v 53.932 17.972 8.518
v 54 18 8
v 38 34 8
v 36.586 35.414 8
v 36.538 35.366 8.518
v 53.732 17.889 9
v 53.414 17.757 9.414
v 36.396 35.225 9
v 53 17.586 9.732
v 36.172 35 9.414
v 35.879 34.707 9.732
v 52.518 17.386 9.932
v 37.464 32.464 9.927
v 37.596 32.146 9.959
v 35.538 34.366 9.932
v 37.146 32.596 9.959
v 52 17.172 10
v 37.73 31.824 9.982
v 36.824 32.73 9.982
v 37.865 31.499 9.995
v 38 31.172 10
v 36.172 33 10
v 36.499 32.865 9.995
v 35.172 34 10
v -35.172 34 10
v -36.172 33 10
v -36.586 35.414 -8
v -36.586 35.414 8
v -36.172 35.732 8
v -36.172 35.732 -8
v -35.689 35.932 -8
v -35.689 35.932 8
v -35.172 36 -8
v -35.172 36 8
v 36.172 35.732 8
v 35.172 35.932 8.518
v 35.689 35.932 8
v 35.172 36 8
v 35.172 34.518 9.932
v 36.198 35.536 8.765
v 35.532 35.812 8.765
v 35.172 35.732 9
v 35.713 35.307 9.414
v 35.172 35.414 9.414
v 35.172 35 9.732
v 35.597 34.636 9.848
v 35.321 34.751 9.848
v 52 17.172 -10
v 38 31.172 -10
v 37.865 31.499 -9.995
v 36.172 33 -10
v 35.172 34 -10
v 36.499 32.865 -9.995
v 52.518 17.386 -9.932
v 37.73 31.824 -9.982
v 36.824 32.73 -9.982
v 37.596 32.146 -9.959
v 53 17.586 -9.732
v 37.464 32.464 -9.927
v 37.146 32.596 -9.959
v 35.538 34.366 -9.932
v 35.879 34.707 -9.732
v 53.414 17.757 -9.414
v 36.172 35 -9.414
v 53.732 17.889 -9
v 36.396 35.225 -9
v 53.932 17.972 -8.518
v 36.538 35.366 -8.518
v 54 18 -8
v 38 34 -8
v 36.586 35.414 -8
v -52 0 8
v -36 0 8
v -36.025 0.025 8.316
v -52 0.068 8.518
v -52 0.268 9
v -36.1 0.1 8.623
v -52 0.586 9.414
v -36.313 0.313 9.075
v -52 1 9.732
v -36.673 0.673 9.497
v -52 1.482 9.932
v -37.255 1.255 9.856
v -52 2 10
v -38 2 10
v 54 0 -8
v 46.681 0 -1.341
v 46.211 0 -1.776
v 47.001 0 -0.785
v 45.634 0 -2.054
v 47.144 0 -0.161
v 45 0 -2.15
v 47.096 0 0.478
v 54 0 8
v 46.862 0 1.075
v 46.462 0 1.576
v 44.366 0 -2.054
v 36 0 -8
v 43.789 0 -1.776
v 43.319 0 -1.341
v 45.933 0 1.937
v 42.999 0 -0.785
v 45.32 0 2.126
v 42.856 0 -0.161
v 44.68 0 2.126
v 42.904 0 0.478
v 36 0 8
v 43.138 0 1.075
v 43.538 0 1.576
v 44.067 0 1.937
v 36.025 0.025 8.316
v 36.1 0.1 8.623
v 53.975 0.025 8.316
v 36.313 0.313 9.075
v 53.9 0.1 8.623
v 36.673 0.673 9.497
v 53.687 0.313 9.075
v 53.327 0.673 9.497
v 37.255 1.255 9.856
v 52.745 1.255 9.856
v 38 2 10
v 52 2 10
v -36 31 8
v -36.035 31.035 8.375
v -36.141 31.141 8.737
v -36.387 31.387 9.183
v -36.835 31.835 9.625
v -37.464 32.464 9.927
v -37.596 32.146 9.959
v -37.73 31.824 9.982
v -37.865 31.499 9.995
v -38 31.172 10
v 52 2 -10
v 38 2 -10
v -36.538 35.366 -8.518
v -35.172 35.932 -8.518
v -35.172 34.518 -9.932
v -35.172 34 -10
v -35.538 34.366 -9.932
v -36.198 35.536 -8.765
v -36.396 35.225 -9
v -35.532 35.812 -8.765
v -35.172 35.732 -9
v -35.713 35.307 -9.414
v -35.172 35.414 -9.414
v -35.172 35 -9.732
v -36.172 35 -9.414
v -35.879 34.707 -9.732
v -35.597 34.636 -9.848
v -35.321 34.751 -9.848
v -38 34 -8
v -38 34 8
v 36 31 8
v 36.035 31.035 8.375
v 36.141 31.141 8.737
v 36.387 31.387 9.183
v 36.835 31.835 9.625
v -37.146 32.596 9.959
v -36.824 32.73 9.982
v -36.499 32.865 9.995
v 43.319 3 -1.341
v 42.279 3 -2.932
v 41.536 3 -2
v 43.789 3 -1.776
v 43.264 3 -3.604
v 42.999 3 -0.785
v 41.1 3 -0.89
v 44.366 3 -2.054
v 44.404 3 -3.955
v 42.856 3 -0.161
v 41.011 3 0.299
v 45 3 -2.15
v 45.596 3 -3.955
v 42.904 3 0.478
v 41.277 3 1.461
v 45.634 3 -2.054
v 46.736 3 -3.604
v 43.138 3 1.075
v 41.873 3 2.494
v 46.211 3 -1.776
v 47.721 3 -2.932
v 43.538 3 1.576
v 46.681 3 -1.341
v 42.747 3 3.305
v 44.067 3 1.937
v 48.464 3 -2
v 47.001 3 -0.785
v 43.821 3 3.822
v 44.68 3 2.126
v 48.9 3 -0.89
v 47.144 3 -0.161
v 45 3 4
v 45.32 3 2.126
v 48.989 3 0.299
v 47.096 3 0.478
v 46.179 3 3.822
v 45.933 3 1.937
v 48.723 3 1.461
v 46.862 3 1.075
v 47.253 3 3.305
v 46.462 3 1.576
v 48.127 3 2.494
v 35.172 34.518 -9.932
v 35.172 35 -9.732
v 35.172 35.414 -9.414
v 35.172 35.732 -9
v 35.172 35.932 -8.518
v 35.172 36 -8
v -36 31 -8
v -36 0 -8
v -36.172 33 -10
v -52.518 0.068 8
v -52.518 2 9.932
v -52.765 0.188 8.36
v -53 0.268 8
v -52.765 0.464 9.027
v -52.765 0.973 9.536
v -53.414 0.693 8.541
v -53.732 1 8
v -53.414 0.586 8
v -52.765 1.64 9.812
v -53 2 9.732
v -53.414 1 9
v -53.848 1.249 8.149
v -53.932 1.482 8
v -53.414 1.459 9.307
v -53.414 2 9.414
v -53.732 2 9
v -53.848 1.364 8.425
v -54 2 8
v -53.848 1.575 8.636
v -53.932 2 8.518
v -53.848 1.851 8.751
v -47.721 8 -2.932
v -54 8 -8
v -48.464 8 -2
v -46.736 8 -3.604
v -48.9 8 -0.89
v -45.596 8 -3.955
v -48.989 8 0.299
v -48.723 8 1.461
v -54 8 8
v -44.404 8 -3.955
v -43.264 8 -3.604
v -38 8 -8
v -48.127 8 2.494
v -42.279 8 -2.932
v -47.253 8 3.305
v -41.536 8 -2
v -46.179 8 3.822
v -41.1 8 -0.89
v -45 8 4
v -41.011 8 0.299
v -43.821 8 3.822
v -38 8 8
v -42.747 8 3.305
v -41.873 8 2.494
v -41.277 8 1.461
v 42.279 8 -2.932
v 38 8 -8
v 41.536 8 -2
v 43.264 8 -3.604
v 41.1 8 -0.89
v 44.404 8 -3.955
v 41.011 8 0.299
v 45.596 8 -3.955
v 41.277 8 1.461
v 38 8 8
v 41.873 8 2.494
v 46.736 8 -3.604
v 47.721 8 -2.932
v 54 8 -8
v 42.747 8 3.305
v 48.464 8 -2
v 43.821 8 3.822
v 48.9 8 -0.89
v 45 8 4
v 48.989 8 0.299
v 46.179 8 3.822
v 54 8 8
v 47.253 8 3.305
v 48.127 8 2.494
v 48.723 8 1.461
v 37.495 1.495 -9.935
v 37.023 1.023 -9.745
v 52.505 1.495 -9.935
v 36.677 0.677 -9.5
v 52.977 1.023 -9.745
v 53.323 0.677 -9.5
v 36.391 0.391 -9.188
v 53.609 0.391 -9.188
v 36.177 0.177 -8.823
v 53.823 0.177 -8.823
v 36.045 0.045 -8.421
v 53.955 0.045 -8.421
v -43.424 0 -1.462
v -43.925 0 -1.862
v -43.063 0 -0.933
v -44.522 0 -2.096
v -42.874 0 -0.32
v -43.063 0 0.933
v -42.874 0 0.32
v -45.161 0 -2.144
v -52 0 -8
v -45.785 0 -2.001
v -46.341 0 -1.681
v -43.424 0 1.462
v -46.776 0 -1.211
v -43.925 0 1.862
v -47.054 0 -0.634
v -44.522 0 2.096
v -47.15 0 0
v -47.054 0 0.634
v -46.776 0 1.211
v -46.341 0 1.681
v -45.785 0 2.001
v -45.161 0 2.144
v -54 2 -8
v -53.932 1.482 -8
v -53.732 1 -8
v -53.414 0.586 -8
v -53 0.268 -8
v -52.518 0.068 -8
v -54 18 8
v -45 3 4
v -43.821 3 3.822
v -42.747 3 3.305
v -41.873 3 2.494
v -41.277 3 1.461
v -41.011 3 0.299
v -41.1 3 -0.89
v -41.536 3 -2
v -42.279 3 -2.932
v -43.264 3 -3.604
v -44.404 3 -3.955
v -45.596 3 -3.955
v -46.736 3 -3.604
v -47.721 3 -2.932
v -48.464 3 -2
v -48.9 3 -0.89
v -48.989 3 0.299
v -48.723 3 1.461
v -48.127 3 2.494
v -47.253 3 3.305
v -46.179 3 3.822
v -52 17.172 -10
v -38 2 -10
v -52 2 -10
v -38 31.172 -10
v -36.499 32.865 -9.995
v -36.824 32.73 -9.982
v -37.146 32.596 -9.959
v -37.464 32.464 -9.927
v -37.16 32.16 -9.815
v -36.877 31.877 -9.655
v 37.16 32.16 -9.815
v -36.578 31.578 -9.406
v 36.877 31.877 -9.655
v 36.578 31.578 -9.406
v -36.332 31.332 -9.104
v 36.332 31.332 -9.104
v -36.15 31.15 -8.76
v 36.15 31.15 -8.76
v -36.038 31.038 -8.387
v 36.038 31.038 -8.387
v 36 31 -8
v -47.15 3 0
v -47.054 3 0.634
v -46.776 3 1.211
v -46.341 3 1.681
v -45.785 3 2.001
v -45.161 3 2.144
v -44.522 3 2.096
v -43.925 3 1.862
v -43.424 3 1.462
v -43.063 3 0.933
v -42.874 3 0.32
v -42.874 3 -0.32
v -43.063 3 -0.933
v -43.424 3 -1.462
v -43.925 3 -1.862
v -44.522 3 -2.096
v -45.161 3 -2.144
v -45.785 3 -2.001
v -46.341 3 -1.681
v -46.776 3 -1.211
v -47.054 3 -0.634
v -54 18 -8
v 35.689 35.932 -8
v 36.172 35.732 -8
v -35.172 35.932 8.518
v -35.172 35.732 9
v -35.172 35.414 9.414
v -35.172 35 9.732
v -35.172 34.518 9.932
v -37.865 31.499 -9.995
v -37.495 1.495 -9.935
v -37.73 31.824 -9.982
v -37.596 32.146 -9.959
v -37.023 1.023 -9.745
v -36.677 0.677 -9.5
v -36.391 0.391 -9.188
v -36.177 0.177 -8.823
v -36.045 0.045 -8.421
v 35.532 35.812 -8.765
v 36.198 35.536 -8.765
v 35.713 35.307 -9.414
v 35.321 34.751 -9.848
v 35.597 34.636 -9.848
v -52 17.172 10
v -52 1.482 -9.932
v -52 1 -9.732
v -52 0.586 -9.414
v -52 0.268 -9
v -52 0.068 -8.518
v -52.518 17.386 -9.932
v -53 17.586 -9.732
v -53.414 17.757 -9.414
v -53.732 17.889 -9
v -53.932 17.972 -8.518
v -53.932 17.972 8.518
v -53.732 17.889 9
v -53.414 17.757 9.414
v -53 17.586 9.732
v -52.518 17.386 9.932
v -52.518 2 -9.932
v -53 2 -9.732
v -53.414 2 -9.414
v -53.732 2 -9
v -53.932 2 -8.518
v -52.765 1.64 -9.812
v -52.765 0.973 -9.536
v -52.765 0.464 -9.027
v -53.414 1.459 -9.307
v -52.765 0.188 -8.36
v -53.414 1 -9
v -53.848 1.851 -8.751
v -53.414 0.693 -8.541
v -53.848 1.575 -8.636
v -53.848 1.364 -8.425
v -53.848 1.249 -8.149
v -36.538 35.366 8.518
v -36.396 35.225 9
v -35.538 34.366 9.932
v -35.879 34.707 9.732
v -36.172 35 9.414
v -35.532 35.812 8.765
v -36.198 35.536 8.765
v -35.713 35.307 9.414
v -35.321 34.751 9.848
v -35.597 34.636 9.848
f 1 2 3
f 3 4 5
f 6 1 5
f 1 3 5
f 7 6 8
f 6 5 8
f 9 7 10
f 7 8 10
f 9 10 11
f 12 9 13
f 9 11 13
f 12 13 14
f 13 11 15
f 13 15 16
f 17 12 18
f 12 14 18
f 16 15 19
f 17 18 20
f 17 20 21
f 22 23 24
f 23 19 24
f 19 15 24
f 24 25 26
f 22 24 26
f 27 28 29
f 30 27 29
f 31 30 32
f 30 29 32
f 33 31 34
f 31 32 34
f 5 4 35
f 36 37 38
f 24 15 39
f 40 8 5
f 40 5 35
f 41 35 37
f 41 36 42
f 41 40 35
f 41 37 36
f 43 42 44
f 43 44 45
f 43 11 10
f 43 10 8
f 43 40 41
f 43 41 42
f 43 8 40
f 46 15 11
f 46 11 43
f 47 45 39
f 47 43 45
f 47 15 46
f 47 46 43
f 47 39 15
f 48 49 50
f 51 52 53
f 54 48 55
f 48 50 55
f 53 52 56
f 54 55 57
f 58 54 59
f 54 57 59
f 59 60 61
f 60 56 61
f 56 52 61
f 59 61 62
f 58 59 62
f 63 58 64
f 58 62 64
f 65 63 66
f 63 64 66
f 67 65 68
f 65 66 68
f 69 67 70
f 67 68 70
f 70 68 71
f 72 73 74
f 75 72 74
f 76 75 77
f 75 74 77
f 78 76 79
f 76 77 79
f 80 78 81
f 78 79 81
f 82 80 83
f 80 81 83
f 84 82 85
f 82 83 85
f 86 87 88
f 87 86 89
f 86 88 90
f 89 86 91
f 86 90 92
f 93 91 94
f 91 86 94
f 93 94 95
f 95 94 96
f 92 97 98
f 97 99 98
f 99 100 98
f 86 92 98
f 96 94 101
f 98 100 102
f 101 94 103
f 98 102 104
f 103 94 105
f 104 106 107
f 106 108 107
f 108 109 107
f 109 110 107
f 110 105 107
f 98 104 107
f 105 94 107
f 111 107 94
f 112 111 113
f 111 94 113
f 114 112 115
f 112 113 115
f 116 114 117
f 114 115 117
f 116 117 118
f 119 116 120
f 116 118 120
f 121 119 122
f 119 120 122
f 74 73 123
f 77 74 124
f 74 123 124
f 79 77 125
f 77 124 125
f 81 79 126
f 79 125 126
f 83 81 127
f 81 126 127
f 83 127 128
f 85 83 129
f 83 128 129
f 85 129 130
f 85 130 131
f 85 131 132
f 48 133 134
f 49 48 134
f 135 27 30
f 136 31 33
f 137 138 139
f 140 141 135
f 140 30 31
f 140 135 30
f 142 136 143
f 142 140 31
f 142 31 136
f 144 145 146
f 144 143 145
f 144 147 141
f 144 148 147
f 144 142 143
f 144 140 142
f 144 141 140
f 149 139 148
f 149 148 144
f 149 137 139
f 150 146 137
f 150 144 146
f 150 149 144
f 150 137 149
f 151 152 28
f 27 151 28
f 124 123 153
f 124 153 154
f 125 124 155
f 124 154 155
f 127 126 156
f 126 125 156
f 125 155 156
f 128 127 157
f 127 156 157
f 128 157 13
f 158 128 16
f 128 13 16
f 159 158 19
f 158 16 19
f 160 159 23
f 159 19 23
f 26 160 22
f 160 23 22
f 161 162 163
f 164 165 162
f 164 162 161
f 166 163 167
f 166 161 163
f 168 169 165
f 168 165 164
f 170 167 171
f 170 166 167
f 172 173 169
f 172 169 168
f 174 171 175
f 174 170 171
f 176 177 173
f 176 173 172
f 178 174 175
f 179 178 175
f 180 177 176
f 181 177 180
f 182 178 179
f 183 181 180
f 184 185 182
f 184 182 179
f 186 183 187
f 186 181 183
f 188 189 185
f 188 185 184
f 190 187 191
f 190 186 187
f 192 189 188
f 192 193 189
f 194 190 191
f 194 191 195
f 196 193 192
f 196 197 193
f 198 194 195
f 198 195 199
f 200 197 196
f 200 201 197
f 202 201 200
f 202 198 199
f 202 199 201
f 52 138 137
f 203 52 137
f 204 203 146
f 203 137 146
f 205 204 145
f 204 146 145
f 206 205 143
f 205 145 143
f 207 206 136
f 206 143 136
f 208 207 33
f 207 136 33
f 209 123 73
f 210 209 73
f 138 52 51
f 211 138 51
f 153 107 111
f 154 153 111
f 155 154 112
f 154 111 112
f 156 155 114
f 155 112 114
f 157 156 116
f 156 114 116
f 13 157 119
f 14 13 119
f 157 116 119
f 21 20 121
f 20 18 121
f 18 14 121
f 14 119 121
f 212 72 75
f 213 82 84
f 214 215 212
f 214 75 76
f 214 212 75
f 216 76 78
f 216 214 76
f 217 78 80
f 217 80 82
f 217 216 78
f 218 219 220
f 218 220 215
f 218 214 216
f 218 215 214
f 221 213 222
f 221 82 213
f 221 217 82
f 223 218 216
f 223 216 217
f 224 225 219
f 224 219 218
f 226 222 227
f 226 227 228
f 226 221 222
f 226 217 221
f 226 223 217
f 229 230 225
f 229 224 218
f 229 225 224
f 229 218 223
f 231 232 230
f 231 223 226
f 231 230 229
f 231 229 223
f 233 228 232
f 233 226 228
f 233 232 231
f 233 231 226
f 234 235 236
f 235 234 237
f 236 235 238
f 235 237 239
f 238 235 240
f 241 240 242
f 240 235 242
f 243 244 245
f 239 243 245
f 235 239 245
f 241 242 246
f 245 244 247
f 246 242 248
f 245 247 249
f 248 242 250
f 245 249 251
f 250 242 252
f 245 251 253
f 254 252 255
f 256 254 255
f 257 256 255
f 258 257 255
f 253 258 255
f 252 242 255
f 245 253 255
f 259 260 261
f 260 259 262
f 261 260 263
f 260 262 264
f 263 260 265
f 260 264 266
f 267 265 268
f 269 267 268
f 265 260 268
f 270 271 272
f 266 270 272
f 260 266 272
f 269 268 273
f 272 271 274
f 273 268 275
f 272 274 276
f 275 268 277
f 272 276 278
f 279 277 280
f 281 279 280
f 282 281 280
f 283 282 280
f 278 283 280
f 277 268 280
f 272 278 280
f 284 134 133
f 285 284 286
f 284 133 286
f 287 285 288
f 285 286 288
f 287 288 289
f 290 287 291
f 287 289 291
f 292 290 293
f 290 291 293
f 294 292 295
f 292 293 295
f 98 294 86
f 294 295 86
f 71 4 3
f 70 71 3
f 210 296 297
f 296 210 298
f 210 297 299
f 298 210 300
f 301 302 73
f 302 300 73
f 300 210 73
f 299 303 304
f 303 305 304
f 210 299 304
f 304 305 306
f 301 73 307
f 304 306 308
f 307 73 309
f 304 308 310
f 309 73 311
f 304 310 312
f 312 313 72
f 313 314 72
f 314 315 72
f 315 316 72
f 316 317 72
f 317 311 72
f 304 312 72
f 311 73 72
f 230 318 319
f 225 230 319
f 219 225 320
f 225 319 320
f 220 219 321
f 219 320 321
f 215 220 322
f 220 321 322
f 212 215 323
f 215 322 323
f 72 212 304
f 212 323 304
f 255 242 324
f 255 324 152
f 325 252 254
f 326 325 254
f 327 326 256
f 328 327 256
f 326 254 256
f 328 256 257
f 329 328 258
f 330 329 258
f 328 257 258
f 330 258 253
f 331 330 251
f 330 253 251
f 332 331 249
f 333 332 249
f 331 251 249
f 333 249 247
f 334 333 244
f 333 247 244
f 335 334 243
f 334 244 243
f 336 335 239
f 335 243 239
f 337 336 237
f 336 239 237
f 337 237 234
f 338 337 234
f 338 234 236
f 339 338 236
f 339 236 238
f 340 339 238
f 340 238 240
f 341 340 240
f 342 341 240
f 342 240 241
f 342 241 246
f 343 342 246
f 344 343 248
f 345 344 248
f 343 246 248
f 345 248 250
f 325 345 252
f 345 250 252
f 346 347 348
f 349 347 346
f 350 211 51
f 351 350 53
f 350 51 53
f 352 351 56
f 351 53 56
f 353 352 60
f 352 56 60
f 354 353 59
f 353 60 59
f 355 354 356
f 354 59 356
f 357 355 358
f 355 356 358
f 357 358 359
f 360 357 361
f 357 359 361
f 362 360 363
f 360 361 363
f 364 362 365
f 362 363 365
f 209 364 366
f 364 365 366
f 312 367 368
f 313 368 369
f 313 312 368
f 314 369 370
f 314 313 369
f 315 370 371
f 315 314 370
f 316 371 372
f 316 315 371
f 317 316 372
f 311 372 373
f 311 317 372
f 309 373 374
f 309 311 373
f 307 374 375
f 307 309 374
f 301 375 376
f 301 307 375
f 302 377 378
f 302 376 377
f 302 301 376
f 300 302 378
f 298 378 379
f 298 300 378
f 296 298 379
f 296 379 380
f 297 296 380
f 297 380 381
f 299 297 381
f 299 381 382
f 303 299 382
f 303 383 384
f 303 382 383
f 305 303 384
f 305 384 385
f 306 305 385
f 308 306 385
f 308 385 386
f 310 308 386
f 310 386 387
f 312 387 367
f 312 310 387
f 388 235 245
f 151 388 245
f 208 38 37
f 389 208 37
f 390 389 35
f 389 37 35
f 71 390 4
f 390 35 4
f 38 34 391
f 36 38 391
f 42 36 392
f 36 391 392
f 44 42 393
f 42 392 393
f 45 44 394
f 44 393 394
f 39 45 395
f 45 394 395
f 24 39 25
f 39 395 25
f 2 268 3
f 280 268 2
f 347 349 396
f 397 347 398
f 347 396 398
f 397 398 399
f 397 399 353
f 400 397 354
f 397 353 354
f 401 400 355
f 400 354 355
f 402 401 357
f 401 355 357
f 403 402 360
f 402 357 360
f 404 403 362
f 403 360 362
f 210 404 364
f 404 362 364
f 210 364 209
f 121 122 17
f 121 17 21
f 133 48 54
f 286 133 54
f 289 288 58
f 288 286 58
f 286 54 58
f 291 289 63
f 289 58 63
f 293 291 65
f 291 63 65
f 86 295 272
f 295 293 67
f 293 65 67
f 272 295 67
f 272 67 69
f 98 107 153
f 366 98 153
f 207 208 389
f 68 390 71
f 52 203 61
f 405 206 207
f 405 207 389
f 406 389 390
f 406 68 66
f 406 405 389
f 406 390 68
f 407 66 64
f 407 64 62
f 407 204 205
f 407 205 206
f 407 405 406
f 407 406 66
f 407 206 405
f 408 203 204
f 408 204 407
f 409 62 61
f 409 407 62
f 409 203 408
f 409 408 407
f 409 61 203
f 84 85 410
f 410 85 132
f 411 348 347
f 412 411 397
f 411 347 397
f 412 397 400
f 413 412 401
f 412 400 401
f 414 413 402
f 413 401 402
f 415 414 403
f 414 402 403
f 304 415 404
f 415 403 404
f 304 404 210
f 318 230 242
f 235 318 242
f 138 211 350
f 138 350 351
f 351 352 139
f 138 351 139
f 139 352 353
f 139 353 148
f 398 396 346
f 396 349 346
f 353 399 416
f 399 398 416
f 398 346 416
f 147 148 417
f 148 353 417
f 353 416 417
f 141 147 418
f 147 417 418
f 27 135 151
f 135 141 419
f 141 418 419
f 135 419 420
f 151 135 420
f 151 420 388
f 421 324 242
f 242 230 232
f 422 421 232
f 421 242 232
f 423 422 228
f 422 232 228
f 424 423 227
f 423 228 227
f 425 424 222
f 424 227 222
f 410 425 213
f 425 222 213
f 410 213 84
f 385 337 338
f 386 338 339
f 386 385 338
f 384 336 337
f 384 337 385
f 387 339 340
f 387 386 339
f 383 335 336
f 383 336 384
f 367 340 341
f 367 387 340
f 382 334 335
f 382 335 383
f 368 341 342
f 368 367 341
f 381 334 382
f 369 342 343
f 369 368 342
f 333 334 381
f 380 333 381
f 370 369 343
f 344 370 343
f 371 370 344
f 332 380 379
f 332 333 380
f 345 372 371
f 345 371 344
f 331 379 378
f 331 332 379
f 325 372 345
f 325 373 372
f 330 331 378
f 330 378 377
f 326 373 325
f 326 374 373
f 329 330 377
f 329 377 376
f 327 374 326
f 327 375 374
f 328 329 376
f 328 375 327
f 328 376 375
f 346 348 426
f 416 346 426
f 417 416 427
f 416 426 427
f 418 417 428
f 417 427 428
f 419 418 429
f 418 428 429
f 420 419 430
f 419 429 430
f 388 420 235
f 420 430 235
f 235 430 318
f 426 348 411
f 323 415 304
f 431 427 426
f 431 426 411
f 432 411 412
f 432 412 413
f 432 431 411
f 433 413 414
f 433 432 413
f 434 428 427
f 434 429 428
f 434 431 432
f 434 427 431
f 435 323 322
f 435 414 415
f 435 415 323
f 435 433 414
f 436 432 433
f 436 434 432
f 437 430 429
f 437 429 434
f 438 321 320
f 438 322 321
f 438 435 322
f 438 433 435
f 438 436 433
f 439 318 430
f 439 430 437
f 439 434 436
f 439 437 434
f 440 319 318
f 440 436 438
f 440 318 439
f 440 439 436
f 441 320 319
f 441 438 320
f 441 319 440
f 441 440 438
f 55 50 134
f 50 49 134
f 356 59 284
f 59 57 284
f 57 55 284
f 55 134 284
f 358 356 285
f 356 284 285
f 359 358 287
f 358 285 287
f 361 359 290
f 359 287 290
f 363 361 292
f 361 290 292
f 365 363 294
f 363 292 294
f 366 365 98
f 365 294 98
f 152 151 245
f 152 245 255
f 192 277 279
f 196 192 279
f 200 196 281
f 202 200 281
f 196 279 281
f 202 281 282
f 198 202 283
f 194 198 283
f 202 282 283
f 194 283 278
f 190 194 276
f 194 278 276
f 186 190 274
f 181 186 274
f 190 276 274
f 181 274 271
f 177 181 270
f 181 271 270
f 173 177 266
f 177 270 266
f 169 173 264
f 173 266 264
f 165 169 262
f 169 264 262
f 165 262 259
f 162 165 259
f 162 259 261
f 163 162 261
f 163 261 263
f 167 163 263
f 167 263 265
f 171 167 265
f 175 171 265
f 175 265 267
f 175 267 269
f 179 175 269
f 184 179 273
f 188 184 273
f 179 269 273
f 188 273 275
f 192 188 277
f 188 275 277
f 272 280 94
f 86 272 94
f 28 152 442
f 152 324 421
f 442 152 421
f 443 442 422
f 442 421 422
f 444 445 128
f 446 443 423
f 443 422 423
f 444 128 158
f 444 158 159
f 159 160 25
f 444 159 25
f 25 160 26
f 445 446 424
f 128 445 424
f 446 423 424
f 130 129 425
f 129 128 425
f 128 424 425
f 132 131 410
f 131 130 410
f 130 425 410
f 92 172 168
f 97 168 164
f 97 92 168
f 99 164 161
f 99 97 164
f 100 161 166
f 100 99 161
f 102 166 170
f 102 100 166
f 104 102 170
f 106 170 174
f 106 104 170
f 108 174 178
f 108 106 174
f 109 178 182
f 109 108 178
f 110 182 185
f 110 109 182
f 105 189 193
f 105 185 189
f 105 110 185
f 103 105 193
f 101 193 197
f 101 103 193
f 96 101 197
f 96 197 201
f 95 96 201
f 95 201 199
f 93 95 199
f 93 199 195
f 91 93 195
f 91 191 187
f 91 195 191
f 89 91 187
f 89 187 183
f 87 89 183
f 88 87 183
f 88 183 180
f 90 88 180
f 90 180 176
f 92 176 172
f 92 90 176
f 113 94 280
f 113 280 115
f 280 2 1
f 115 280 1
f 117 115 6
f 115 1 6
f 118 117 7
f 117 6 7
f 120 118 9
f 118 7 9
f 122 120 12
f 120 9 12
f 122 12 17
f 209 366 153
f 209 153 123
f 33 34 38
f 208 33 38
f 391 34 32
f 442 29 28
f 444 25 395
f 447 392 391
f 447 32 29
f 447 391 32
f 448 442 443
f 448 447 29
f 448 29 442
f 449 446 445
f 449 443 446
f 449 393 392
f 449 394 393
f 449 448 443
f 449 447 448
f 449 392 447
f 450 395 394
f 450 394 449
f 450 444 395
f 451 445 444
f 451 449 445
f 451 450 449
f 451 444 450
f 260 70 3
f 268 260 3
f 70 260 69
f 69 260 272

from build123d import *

# Parameters (mm, degrees)
EXTRUDE_1_DEPTH     = 10
SKETCH_2_R          = 2.15
CUT_EXTRUDE_1_DEPTH = 66.665820638
CUT_EXTRUDE_START   = -8
SKETCH_3_W          = 16
SKETCH_3_H          = 16
CUT_EXTRUDE_2_DEPTH = 58.665820638
SKETCH_4_R          = 4
CUT_EXTRUDE_3_DEPTH = 5
FILLET_1_R          = 2


with BuildPart() as part:
    # 草图1 → 凸台-拉伸1 (new, symmetric)
    with BuildSketch(Plane.XY):
        Polygon((-54, 0), (-54, 18), (-36, 36), (36, 36), (54, 18), (54, 0), (36, 0), (36, 31), (-36, 31), (-36, 0), align=None)
    extrude(amount=EXTRUDE_1_DEPTH, both=True)

    # 草图2 → 切除-拉伸1 (cut, through all)
    with BuildSketch(Plane(origin=(0, 0, 0), x_dir=(1, 0, 0), z_dir=(0, 1, 0))):
        with Locations(Location((-45, 0, 0), (0, 0, 180))):
            Circle(SKETCH_2_R)
        with Locations(Location((45, 0, 0), (0, 0, 90))):
            Circle(SKETCH_2_R)
    extrude(amount=CUT_EXTRUDE_1_DEPTH, mode=Mode.SUBTRACT)

    # 草图3 → 切除-拉伸2 (cut, through all)
    with BuildSketch(Plane.XZ.offset(CUT_EXTRUDE_START)):
        with Locations((-46, 0)):
            Rectangle(SKETCH_3_W, SKETCH_3_H)
        with Locations((46, 0)):
            Rectangle(SKETCH_3_W, SKETCH_3_H)
    extrude(amount=-CUT_EXTRUDE_2_DEPTH, mode=Mode.SUBTRACT)

    # 草图4 → 切除-拉伸3 (cut)
    with BuildSketch(Plane(origin=(0, 8, 0), x_dir=(1, 0, 0), z_dir=(0, 1, 0))):
        with Locations(Location((45, 0, 0), (0, 0, 270))):
            Circle(SKETCH_4_R)
        with Locations(Location((-45, 0, 0), (0, 0, 270))):
            Circle(SKETCH_4_R)
    extrude(amount=-CUT_EXTRUDE_3_DEPTH, mode=Mode.SUBTRACT)

    # 圆角1
    # the kernel refuses this fillet: 2 mm, written as the material it takes off along each edge
    with BuildSketch(Plane(origin=(-52, 2, 8), x_dir=(0, -1, 0), z_dir=(-1, 0, 0))) as fillet_1_piece_1_section:
        Polygon((0, 0), (FILLET_1_R, 0), (FILLET_1_R, FILLET_1_R), (0, FILLET_1_R), align=None)
    fillet_1_piece_1 = extrude(amount=FILLET_1_R, mode=Mode.PRIVATE)
    fillet_1_piece_1 = fillet_1_piece_1 - Plane(origin=(-52, 2, 8), x_dir=(0, 0.7071067811865475, -0.7071067811865475), z_dir=(-1, 0, 0)) * Sphere(FILLET_1_R, mode=Mode.PRIVATE)
    add(fillet_1_piece_1, mode=Mode.SUBTRACT)
    with BuildSketch(Plane(origin=(-35.171572875, 34, 8), x_dir=(-0.7071067811865515, 0.7071067811865437, 0), z_dir=(0, 0, 1))) as fillet_1_piece_2_section:
        Polygon((0, 0), (FILLET_1_R, 0), (FILLET_1_R, -FILLET_1_R * 0.414213562373), (FILLET_1_R * 0.707106781187, -FILLET_1_R * 0.707106781187), align=None)
    fillet_1_piece_2 = extrude(amount=FILLET_1_R, mode=Mode.PRIVATE)
    fillet_1_piece_2 = fillet_1_piece_2 - Plane(origin=(-35.171572875, 34, 8), x_dir=(0.38268343236509234, -0.9238795325112857, 0), z_dir=(0, 0, 1)) * Sphere(FILLET_1_R, mode=Mode.PRIVATE)
    add(fillet_1_piece_2, mode=Mode.SUBTRACT)
    with BuildSketch(Plane(origin=(35.171572875, 34, 8), x_dir=(0.7071067811865515, 0.7071067811865437, 0), z_dir=(0, 0, 1))) as fillet_1_piece_3_section:
        Polygon((0, 0), (FILLET_1_R, 0), (FILLET_1_R, FILLET_1_R * 0.414213562373), (FILLET_1_R * 0.707106781187, FILLET_1_R * 0.707106781187), align=None)
    fillet_1_piece_3 = extrude(amount=FILLET_1_R, mode=Mode.PRIVATE)
    fillet_1_piece_3 = fillet_1_piece_3 - Plane(origin=(35.171572875, 34, 8), x_dir=(-0.38268343236509234, -0.9238795325112857, 0), z_dir=(0, 0, 1)) * Sphere(FILLET_1_R, mode=Mode.PRIVATE)
    add(fillet_1_piece_3, mode=Mode.SUBTRACT)
    with BuildSketch(Plane(origin=(35.171572875, 34, -8), x_dir=(0, 1, 0), z_dir=(0, 0, -1))) as fillet_1_piece_4_section:
        Polygon((0, 0), (FILLET_1_R, 0), (FILLET_1_R, FILLET_1_R * 0.414213562373), (FILLET_1_R * 0.707106781187, FILLET_1_R * 0.707106781187), align=None)
    fillet_1_piece_4 = extrude(amount=FILLET_1_R, mode=Mode.PRIVATE)
    fillet_1_piece_4 = fillet_1_piece_4 - Plane(origin=(35.171572875, 34, -8), x_dir=(-0.38268343236509234, -0.9238795325112857, 0), z_dir=(0, 0, -1)) * Sphere(FILLET_1_R, mode=Mode.PRIVATE)
    add(fillet_1_piece_4, mode=Mode.SUBTRACT)
    with BuildSketch(Plane(origin=(-35.171572875, 34, -8), x_dir=(0, 1, 0), z_dir=(0, 0, -1))) as fillet_1_piece_5_section:
        Polygon((0, 0), (FILLET_1_R, 0), (FILLET_1_R, -FILLET_1_R * 0.414213562373), (FILLET_1_R * 0.707106781187, -FILLET_1_R * 0.707106781187), align=None)
    fillet_1_piece_5 = extrude(amount=FILLET_1_R, mode=Mode.PRIVATE)
    fillet_1_piece_5 = fillet_1_piece_5 - Plane(origin=(-35.171572875, 34, -8), x_dir=(0.38268343236509234, -0.9238795325112857, 0), z_dir=(0, 0, -1)) * Sphere(FILLET_1_R, mode=Mode.PRIVATE)
    add(fillet_1_piece_5, mode=Mode.SUBTRACT)
    with BuildSketch(Plane(origin=(-52, 2, -8), x_dir=(0, -1, 0), z_dir=(-1, 0, 0))) as fillet_1_piece_6_section:
        Polygon((0, 0), (FILLET_1_R, 0), (FILLET_1_R, -FILLET_1_R), (0, -FILLET_1_R), align=None)
    fillet_1_piece_6 = extrude(amount=FILLET_1_R, mode=Mode.PRIVATE)
    fillet_1_piece_6 = fillet_1_piece_6 - Plane(origin=(-52, 2, -8), x_dir=(0, 0.7071067811865475, 0.7071067811865475), z_dir=(-1, 0, 0)) * Sphere(FILLET_1_R, mode=Mode.PRIVATE)
    add(fillet_1_piece_6, mode=Mode.SUBTRACT)
    with BuildSketch(Plane(origin=(-54, 2, 10), x_dir=(0, 0, -1), z_dir=(0, 1, 0)), Plane(origin=(-31, 0, 10), x_dir=(0, 0, -1), z_dir=(-1, 0, 0))) as fillet_1_piece_7:
        with BuildLine():
            CenterArc((FILLET_1_R, -FILLET_1_R), FILLET_1_R, 90, 90)
            Line((0, -FILLET_1_R), (0, 0))
            Line((0, 0), (FILLET_1_R, 0))
        make_face()
    extrude(amount=21, mode=Mode.SUBTRACT)
    with BuildSketch(Plane(origin=(-57.535533906, 14.464466094, 10), x_dir=(0.7071067811865515, -0.7071067811865437, 0), z_dir=(0.7071067811865437, 0.7071067811865515, 0)), Plane(origin=(36.585786438, 35.414213562, 10), x_dir=(-0.7071067811865515, -0.7071067811865437, 0), z_dir=(0.7071067811865437, -0.7071067811865515, 0)), Plane(origin=(-57.535533906, 14.464466094, -10), x_dir=(0, 0, 1), z_dir=(0.7071067811865437, 0.7071067811865515, 0))) as fillet_1_piece_8:
        with BuildLine():
            CenterArc((FILLET_1_R, FILLET_1_R), FILLET_1_R, 180, 90)
            Line((0, FILLET_1_R), (0, 0))
            Line((0, 0), (FILLET_1_R, 0))
        make_face()
    extrude(amount=29.627416998, mode=Mode.SUBTRACT)
    with BuildSketch(Plane(origin=(54, 23, 10), x_dir=(-1, 0, 0), z_dir=(0, -1, 0)), Plane(origin=(59, 0, 10), x_dir=(0, 1, 0), z_dir=(-1, 0, 0))) as fillet_1_piece_9:
        with BuildLine():
            CenterArc((FILLET_1_R, FILLET_1_R), FILLET_1_R, 180, 90)
            Line((0, FILLET_1_R), (0, 0))
            Line((0, 0), (FILLET_1_R, 0))
        make_face()
    extrude(amount=28, mode=Mode.SUBTRACT)
    with BuildSketch(Plane(origin=(36, -5, 10), x_dir=(1, 0, 0), z_dir=(0, 1, 0)), Plane(origin=(-36, 31, 10), x_dir=(-1, 0, 0), z_dir=(0, -1, 0))) as fillet_1_piece_10:
        with BuildLine():
            CenterArc((FILLET_1_R, FILLET_1_R), FILLET_1_R, 180, 90)
            Line((0, FILLET_1_R), (0, 0))
            Line((0, 0), (FILLET_1_R, 0))
        make_face()
    extrude(amount=36, mode=Mode.SUBTRACT)
    with BuildSketch(Plane(origin=(36, 31, 10), x_dir=(0, 1, 0), z_dir=(-1, 0, 0))) as fillet_1_piece_11:
        with BuildLine():
            CenterArc((FILLET_1_R, FILLET_1_R), FILLET_1_R, 180, 90)
            Line((0, FILLET_1_R), (0, 0))
            Line((0, 0), (FILLET_1_R, 0))
        make_face()
    extrude(amount=72, mode=Mode.SUBTRACT)
    with BuildSketch(Plane(origin=(-36, 31, -10), x_dir=(-1, 0, 0), z_dir=(0, -1, 0)), Plane(origin=(36, -5, -10), x_dir=(1, 0, 0), z_dir=(0, 1, 0))) as fillet_1_piece_12:
        with BuildLine():
            CenterArc((FILLET_1_R, -FILLET_1_R), FILLET_1_R, 90, 90)
            Line((0, -FILLET_1_R), (0, 0))
            Line((0, 0), (FILLET_1_R, 0))
        make_face()
    extrude(amount=36, mode=Mode.SUBTRACT)
    with BuildSketch(Plane(origin=(36, 31, -10), x_dir=(0, 1, 0), z_dir=(-1, 0, 0))) as fillet_1_piece_13:
        with BuildLine():
            CenterArc((FILLET_1_R, -FILLET_1_R), FILLET_1_R, 90, 90)
            Line((0, -FILLET_1_R), (0, 0))
            Line((0, 0), (FILLET_1_R, 0))
        make_face()
    extrude(amount=72, mode=Mode.SUBTRACT)
    with BuildSketch(Plane(origin=(59, 0, -10), x_dir=(0, 1, 0), z_dir=(-1, 0, 0)), Plane(origin=(54, 23, -10), x_dir=(-1, 0, 0), z_dir=(0, -1, 0))) as fillet_1_piece_14:
        with BuildLine():
            CenterArc((FILLET_1_R, -FILLET_1_R), FILLET_1_R, 90, 90)
            Line((0, -FILLET_1_R), (0, 0))
            Line((0, 0), (FILLET_1_R, 0))
        make_face()
    extrude(amount=28, mode=Mode.SUBTRACT)
    with BuildSketch(Plane(origin=(36.585786438, 35.414213562, -10), x_dir=(-0.7071067811865515, -0.7071067811865437, 0), z_dir=(0.7071067811865437, -0.7071067811865515, 0))) as fillet_1_piece_15:
        with BuildLine():
            CenterArc((FILLET_1_R, -FILLET_1_R), FILLET_1_R, 90, 90)
            Line((0, -FILLET_1_R), (0, 0))
            Line((0, 0), (FILLET_1_R, 0))
        make_face()
    extrude(amount=29.627416998, mode=Mode.SUBTRACT)
    with BuildSketch(Plane(origin=(-54, 2, -10), x_dir=(0, 0, 1), z_dir=(0, 1, 0)), Plane(origin=(-31, 0, -10), x_dir=(0, 0, 1), z_dir=(-1, 0, 0))) as fillet_1_piece_16:
        with BuildLine():
            CenterArc((FILLET_1_R, FILLET_1_R), FILLET_1_R, 180, 90)
            Line((0, FILLET_1_R), (0, 0))
            Line((0, 0), (FILLET_1_R, 0))
        make_face()
    extrude(amount=21, mode=Mode.SUBTRACT)
    with BuildSketch(Plane(origin=(36, 36, 8), x_dir=(-1, 0, 0), z_dir=(0, 0, -1)), Plane(origin=(-36, 36, 8), x_dir=(-0.7071067811865432, -0.7071067811865518, 0), z_dir=(0, 0, -1))) as fillet_1_piece_17:
        with BuildLine():
            CenterArc((FILLET_1_R * 0.414213562373, -FILLET_1_R), FILLET_1_R, 90, 45)
            Line((-FILLET_1_R * 0.292893218813, -FILLET_1_R * 0.292893218813), (0, 0))
            Line((0, 0), (FILLET_1_R * 0.414213562373, 0))
        make_face()
    extrude(amount=16, mode=Mode.SUBTRACT)
    with BuildSketch(Plane(origin=(-35.171572875, 36, 10), x_dir=(0, -1, 0), z_dir=(1, 0, 0))) as fillet_1_piece_18:
        with BuildLine():
            CenterArc((FILLET_1_R, FILLET_1_R), FILLET_1_R, 180, 90)
            Line((0, FILLET_1_R), (0, 0))
            Line((0, 0), (FILLET_1_R, 0))
        make_face()
    extrude(amount=70.343145751, mode=Mode.SUBTRACT)
    with BuildSketch(Plane(origin=(-35.171572875, 36, -10), x_dir=(0, -1, 0), z_dir=(1, 0, 0))) as fillet_1_piece_19:
        with BuildLine():
            CenterArc((FILLET_1_R, -FILLET_1_R), FILLET_1_R, 90, 90)
            Line((0, -FILLET_1_R), (0, 0))
            Line((0, 0), (FILLET_1_R, 0))
        make_face()
    extrude(amount=70.343145751, mode=Mode.SUBTRACT)
    with BuildSketch(Plane(origin=(-54, 0, -8), x_dir=(0, 1, 0), z_dir=(0, 0, 1))) as fillet_1_piece_20:
        with BuildLine():
            CenterArc((FILLET_1_R, -FILLET_1_R), FILLET_1_R, 90, 90)
            Line((0, -FILLET_1_R), (0, 0))
            Line((0, 0), (FILLET_1_R, 0))
        make_face()
    extrude(amount=16, mode=Mode.SUBTRACT)
    with BuildSketch(Plane(origin=(36, -5, 10), x_dir=(1, 0, 0), z_dir=(0, 1, 0))) as fillet_1_piece_21a_section:
        with BuildLine():
            CenterArc((FILLET_1_R, FILLET_1_R), FILLET_1_R, 180, 90)
            Line((0, FILLET_1_R), (0, 0))
            Line((0, 0), (FILLET_1_R, 0))
        make_face()
    fillet_1_piece_21a = extrude(amount=41, mode=Mode.PRIVATE)
    fillet_1_piece_21a = split(fillet_1_piece_21a, bisect_by=Plane(origin=(36.452790229, 31, 9.547209771), z_dir=(0, 1, 0)), keep=Keep.TOP, mode=Mode.PRIVATE)
    with BuildSketch(Plane(origin=(41, 31, 10), x_dir=(0, 1, 0), z_dir=(-1, 0, 0))) as fillet_1_piece_21b_section:
        with BuildLine():
            CenterArc((FILLET_1_R, FILLET_1_R), FILLET_1_R, 180, 90)
            Line((0, FILLET_1_R), (0, 0))
            Line((0, 0), (FILLET_1_R, 0))
        make_face()
    fillet_1_piece_21b = extrude(amount=77, mode=Mode.PRIVATE)
    fillet_1_piece_21b = split(fillet_1_piece_21b, bisect_by=Plane(origin=(36, 31.452790229, 9.547209771), z_dir=(1, 0, 0)), keep=Keep.TOP, mode=Mode.PRIVATE)
    fillet_1_piece_21 = fillet_1_piece_21a & fillet_1_piece_21b
    add(fillet_1_piece_21, mode=Mode.SUBTRACT)
    with BuildSketch(Plane(origin=(36, 31, 10), x_dir=(0, 1, 0), z_dir=(-1, 0, 0))) as fillet_1_piece_22a_section:
        with BuildLine():
            CenterArc((FILLET_1_R, FILLET_1_R), FILLET_1_R, 180, 90)
            Line((0, FILLET_1_R), (0, 0))
            Line((0, 0), (FILLET_1_R, 0))
        make_face()
    fillet_1_piece_22a = extrude(amount=77, mode=Mode.PRIVATE)
    fillet_1_piece_22a = split(fillet_1_piece_22a, bisect_by=Plane(origin=(-36, 31.452790229, 9.547209771), z_dir=(-1, 0, 0)), keep=Keep.TOP, mode=Mode.PRIVATE)
    with BuildSketch(Plane(origin=(-36, 36, 10), x_dir=(-1, 0, 0), z_dir=(0, -1, 0))) as fillet_1_piece_22b_section:
        with BuildLine():
            CenterArc((FILLET_1_R, FILLET_1_R), FILLET_1_R, 180, 90)
            Line((0, FILLET_1_R), (0, 0))
            Line((0, 0), (FILLET_1_R, 0))
        make_face()
    fillet_1_piece_22b = extrude(amount=41, mode=Mode.PRIVATE)
    fillet_1_piece_22b = split(fillet_1_piece_22b, bisect_by=Plane(origin=(-36.452790229, 31, 9.547209771), z_dir=(0, 1, 0)), keep=Keep.TOP, mode=Mode.PRIVATE)
    fillet_1_piece_22 = fillet_1_piece_22a & fillet_1_piece_22b
    add(fillet_1_piece_22, mode=Mode.SUBTRACT)
    with BuildSketch(Plane(origin=(36, 31, -10), x_dir=(0, 1, 0), z_dir=(-1, 0, 0))) as fillet_1_piece_23a_section:
        with BuildLine():
            CenterArc((FILLET_1_R, -FILLET_1_R), FILLET_1_R, 90, 90)
            Line((0, -FILLET_1_R), (0, 0))
            Line((0, 0), (FILLET_1_R, 0))
        make_face()
    fillet_1_piece_23a = extrude(amount=77, mode=Mode.PRIVATE)
    fillet_1_piece_23a = split(fillet_1_piece_23a, bisect_by=Plane(origin=(-36, 31.452790229, -9.547209771), z_dir=(-1, 0, 0)), keep=Keep.TOP, mode=Mode.PRIVATE)
    with BuildSketch(Plane(origin=(-36, 36, -10), x_dir=(-1, 0, 0), z_dir=(0, -1, 0))) as fillet_1_piece_23b_section:
        with BuildLine():
            CenterArc((FILLET_1_R, -FILLET_1_R), FILLET_1_R, 90, 90)
            Line((0, -FILLET_1_R), (0, 0))
            Line((0, 0), (FILLET_1_R, 0))
        make_face()
    fillet_1_piece_23b = extrude(amount=41, mode=Mode.PRIVATE)
    fillet_1_piece_23b = split(fillet_1_piece_23b, bisect_by=Plane(origin=(-36.452790229, 31, -9.547209771), z_dir=(0, 1, 0)), keep=Keep.TOP, mode=Mode.PRIVATE)
    fillet_1_piece_23 = fillet_1_piece_23a & fillet_1_piece_23b
    add(fillet_1_piece_23, mode=Mode.SUBTRACT)
    with BuildSketch(Plane(origin=(36, -5, -10), x_dir=(1, 0, 0), z_dir=(0, 1, 0))) as fillet_1_piece_24a_section:
        with BuildLine():
            CenterArc((FILLET_1_R, -FILLET_1_R), FILLET_1_R, 90, 90)
            Line((0, -FILLET_1_R), (0, 0))
            Line((0, 0), (FILLET_1_R, 0))
        make_face()
    fillet_1_piece_24a = extrude(amount=41, mode=Mode.PRIVATE)
    fillet_1_piece_24a = split(fillet_1_piece_24a, bisect_by=Plane(origin=(36.452790229, 31, -9.547209771), z_dir=(0, 1, 0)), keep=Keep.TOP, mode=Mode.PRIVATE)
    with BuildSketch(Plane(origin=(41, 31, -10), x_dir=(0, 1, 0), z_dir=(-1, 0, 0))) as fillet_1_piece_24b_section:
        with BuildLine():
            CenterArc((FILLET_1_R, -FILLET_1_R), FILLET_1_R, 90, 90)
            Line((0, -FILLET_1_R), (0, 0))
            Line((0, 0), (FILLET_1_R, 0))
        make_face()
    fillet_1_piece_24b = extrude(amount=77, mode=Mode.PRIVATE)
    fillet_1_piece_24b = split(fillet_1_piece_24b, bisect_by=Plane(origin=(36, 31.452790229, -9.547209771), z_dir=(1, 0, 0)), keep=Keep.TOP, mode=Mode.PRIVATE)
    fillet_1_piece_24 = fillet_1_piece_24a & fillet_1_piece_24b
    add(fillet_1_piece_24, mode=Mode.SUBTRACT)


solid = part.part
